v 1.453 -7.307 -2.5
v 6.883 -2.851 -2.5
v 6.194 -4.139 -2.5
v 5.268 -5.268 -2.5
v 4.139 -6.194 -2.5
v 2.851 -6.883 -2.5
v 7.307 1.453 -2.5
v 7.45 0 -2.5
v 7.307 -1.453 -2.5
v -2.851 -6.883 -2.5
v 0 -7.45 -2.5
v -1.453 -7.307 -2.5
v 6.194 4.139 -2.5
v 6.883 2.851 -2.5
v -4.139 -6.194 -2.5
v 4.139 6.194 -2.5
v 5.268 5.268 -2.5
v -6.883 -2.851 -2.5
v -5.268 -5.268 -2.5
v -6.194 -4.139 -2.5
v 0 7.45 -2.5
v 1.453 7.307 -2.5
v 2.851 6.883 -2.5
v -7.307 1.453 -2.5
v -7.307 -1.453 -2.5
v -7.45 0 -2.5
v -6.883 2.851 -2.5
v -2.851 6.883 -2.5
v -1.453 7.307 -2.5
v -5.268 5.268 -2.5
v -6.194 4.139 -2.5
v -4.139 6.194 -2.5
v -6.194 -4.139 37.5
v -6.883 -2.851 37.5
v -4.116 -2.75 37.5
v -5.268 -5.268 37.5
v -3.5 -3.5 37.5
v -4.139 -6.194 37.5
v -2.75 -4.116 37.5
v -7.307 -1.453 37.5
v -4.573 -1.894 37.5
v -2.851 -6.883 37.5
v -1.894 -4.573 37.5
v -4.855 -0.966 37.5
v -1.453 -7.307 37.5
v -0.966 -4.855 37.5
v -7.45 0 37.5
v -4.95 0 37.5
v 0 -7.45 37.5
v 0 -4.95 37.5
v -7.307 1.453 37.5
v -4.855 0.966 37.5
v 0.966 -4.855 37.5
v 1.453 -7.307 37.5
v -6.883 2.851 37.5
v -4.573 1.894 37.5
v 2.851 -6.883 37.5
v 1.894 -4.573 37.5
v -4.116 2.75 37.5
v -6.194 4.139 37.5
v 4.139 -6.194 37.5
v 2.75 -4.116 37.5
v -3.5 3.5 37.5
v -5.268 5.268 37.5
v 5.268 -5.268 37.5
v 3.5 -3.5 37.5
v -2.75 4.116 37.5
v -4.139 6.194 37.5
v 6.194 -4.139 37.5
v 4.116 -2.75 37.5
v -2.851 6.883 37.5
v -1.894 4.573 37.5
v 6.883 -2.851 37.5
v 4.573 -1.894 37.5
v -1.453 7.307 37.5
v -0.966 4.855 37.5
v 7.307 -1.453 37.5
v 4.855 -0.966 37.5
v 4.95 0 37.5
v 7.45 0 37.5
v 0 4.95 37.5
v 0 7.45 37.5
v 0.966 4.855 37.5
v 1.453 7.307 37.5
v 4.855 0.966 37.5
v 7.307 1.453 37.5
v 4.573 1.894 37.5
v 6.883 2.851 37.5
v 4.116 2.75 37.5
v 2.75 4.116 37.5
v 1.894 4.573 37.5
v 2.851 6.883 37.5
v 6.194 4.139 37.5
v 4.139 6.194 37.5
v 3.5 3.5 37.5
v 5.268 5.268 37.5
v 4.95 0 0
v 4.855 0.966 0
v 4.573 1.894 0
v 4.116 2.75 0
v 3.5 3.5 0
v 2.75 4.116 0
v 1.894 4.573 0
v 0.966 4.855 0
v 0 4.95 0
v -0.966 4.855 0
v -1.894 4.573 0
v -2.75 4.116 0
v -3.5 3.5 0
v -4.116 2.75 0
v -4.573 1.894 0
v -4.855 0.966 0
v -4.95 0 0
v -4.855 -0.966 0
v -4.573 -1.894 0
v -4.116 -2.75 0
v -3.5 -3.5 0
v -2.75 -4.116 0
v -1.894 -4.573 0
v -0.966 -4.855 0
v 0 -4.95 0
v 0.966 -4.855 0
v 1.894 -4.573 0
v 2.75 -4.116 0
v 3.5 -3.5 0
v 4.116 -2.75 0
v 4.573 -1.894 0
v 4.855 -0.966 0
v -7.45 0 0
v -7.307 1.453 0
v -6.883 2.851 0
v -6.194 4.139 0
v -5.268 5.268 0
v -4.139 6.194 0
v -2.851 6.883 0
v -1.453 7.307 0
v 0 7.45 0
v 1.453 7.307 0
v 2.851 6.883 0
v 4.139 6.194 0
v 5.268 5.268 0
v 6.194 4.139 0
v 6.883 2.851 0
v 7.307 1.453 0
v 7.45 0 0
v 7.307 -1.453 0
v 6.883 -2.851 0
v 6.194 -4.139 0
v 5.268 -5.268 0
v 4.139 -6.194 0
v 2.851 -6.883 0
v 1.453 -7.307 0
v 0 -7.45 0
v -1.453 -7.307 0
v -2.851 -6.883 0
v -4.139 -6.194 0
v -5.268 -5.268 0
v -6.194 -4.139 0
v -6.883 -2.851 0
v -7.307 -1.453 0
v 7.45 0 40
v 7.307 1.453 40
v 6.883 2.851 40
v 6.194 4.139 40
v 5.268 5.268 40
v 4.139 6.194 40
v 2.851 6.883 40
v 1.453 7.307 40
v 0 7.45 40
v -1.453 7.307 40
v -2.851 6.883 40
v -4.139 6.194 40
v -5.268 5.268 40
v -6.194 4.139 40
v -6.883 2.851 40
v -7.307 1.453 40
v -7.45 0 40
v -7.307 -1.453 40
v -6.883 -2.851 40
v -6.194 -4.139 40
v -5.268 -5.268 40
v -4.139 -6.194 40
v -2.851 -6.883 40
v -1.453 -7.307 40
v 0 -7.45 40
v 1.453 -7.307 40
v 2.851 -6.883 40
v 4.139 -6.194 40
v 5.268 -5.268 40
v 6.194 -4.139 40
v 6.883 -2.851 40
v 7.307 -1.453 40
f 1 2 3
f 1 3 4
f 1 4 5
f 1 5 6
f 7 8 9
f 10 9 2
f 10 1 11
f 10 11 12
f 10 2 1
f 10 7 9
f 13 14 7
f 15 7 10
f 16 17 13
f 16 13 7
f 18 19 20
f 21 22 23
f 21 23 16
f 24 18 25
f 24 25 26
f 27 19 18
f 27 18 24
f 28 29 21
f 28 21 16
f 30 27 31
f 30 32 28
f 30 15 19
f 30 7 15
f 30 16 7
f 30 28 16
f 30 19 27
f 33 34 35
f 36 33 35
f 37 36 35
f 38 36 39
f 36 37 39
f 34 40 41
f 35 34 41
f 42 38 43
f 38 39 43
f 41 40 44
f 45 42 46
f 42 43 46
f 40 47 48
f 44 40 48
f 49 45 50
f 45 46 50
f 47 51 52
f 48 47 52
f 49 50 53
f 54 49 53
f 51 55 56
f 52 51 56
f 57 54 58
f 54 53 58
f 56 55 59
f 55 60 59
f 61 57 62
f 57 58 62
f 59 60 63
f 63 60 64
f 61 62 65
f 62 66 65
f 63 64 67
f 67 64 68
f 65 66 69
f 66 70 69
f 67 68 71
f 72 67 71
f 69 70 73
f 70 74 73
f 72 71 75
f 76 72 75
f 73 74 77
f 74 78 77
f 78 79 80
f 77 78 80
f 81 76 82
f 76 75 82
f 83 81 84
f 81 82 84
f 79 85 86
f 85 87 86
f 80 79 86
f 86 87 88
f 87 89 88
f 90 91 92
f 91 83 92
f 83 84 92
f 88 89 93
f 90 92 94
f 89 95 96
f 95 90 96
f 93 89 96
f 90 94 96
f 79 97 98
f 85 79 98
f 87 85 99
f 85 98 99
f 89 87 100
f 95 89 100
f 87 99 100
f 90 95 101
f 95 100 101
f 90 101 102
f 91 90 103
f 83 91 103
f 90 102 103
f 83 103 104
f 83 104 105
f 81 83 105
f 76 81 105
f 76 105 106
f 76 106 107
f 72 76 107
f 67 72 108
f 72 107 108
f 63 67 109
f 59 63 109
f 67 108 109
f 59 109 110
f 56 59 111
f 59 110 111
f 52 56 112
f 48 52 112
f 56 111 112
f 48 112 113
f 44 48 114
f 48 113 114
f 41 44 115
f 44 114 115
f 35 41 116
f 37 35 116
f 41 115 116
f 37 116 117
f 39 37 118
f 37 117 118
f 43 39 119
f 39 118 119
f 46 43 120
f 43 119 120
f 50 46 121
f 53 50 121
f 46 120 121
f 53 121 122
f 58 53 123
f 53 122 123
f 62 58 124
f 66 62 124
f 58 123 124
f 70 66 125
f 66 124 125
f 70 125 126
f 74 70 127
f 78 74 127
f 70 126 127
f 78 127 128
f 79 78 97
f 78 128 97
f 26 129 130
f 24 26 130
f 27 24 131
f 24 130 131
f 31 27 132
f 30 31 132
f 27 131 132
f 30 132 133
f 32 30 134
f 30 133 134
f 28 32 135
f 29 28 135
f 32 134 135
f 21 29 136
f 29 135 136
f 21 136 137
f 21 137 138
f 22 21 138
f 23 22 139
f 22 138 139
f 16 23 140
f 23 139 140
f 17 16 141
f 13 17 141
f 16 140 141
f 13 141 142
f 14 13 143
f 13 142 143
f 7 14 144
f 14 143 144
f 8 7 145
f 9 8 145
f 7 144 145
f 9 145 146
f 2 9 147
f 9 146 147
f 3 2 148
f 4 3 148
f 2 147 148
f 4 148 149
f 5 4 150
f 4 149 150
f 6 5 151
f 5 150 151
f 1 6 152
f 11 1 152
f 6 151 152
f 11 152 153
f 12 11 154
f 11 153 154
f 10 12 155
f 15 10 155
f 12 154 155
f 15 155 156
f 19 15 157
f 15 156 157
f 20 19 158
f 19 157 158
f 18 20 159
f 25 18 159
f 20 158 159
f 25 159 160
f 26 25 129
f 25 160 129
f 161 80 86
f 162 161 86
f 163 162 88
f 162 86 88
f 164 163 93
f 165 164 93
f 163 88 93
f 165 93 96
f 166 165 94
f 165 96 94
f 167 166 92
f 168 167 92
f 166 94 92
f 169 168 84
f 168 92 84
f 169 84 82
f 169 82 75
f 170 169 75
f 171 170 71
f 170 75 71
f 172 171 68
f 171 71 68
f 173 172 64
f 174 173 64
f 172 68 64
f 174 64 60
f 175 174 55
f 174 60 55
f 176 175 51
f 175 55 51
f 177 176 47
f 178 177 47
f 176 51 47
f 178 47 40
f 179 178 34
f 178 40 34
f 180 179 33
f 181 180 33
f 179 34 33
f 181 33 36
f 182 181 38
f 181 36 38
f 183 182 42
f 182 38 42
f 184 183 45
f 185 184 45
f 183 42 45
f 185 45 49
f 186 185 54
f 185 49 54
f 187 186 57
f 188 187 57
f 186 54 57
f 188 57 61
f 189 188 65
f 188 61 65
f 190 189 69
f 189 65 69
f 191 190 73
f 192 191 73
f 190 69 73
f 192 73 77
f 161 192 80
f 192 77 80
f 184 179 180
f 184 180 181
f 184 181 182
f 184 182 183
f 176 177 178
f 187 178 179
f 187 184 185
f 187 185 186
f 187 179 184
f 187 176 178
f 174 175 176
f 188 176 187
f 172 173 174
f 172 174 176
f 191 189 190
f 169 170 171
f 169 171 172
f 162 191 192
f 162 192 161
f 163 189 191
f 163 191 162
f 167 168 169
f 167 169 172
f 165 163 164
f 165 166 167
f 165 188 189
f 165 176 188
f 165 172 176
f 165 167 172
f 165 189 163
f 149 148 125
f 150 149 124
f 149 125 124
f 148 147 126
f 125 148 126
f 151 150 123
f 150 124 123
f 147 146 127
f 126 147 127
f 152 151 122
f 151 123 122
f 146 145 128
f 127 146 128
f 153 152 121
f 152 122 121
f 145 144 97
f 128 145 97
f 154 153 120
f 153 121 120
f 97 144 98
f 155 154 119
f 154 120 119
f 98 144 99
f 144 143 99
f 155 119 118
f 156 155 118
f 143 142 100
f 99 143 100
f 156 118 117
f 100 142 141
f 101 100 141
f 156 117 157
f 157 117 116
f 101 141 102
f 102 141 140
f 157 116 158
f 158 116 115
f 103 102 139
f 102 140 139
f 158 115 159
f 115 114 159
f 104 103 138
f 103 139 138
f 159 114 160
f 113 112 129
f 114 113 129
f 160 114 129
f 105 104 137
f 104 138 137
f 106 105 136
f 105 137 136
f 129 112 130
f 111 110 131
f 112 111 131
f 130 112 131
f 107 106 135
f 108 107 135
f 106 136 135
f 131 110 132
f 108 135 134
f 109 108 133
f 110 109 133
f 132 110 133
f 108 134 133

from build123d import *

# Parameters (mm, degrees)
SKETCH1_R           = 4.95
BOSS_EXTRUDE1_DEPTH = 37.5
SKETCH2_R           = 7.45
BOSS_EXTRUDE2_DEPTH = 2.5
SKETCH3_R           = 7.45
BOSS_EXTRUDE3_DEPTH = 2.5


with BuildPart() as part:
    # Sketch1 → Boss-Extrude1 (new body)
    with BuildSketch(Plane.XY):
        Circle(SKETCH1_R)
    extrude(amount=BOSS_EXTRUDE1_DEPTH)

    # Sketch2 → Boss-Extrude2 (add)
    with BuildSketch(Plane(origin=(0, 0, 0), x_dir=(-1, 0, 0), z_dir=(0, 0, -1))):
        Circle(SKETCH2_R)
    extrude(amount=BOSS_EXTRUDE2_DEPTH)

    # Sketch3 → Boss-Extrude3 (add)
    with BuildSketch(Plane.XY.offset(37.5)):
        Circle(SKETCH3_R)
    extrude(amount=BOSS_EXTRUDE3_DEPTH)


solid = part.part
